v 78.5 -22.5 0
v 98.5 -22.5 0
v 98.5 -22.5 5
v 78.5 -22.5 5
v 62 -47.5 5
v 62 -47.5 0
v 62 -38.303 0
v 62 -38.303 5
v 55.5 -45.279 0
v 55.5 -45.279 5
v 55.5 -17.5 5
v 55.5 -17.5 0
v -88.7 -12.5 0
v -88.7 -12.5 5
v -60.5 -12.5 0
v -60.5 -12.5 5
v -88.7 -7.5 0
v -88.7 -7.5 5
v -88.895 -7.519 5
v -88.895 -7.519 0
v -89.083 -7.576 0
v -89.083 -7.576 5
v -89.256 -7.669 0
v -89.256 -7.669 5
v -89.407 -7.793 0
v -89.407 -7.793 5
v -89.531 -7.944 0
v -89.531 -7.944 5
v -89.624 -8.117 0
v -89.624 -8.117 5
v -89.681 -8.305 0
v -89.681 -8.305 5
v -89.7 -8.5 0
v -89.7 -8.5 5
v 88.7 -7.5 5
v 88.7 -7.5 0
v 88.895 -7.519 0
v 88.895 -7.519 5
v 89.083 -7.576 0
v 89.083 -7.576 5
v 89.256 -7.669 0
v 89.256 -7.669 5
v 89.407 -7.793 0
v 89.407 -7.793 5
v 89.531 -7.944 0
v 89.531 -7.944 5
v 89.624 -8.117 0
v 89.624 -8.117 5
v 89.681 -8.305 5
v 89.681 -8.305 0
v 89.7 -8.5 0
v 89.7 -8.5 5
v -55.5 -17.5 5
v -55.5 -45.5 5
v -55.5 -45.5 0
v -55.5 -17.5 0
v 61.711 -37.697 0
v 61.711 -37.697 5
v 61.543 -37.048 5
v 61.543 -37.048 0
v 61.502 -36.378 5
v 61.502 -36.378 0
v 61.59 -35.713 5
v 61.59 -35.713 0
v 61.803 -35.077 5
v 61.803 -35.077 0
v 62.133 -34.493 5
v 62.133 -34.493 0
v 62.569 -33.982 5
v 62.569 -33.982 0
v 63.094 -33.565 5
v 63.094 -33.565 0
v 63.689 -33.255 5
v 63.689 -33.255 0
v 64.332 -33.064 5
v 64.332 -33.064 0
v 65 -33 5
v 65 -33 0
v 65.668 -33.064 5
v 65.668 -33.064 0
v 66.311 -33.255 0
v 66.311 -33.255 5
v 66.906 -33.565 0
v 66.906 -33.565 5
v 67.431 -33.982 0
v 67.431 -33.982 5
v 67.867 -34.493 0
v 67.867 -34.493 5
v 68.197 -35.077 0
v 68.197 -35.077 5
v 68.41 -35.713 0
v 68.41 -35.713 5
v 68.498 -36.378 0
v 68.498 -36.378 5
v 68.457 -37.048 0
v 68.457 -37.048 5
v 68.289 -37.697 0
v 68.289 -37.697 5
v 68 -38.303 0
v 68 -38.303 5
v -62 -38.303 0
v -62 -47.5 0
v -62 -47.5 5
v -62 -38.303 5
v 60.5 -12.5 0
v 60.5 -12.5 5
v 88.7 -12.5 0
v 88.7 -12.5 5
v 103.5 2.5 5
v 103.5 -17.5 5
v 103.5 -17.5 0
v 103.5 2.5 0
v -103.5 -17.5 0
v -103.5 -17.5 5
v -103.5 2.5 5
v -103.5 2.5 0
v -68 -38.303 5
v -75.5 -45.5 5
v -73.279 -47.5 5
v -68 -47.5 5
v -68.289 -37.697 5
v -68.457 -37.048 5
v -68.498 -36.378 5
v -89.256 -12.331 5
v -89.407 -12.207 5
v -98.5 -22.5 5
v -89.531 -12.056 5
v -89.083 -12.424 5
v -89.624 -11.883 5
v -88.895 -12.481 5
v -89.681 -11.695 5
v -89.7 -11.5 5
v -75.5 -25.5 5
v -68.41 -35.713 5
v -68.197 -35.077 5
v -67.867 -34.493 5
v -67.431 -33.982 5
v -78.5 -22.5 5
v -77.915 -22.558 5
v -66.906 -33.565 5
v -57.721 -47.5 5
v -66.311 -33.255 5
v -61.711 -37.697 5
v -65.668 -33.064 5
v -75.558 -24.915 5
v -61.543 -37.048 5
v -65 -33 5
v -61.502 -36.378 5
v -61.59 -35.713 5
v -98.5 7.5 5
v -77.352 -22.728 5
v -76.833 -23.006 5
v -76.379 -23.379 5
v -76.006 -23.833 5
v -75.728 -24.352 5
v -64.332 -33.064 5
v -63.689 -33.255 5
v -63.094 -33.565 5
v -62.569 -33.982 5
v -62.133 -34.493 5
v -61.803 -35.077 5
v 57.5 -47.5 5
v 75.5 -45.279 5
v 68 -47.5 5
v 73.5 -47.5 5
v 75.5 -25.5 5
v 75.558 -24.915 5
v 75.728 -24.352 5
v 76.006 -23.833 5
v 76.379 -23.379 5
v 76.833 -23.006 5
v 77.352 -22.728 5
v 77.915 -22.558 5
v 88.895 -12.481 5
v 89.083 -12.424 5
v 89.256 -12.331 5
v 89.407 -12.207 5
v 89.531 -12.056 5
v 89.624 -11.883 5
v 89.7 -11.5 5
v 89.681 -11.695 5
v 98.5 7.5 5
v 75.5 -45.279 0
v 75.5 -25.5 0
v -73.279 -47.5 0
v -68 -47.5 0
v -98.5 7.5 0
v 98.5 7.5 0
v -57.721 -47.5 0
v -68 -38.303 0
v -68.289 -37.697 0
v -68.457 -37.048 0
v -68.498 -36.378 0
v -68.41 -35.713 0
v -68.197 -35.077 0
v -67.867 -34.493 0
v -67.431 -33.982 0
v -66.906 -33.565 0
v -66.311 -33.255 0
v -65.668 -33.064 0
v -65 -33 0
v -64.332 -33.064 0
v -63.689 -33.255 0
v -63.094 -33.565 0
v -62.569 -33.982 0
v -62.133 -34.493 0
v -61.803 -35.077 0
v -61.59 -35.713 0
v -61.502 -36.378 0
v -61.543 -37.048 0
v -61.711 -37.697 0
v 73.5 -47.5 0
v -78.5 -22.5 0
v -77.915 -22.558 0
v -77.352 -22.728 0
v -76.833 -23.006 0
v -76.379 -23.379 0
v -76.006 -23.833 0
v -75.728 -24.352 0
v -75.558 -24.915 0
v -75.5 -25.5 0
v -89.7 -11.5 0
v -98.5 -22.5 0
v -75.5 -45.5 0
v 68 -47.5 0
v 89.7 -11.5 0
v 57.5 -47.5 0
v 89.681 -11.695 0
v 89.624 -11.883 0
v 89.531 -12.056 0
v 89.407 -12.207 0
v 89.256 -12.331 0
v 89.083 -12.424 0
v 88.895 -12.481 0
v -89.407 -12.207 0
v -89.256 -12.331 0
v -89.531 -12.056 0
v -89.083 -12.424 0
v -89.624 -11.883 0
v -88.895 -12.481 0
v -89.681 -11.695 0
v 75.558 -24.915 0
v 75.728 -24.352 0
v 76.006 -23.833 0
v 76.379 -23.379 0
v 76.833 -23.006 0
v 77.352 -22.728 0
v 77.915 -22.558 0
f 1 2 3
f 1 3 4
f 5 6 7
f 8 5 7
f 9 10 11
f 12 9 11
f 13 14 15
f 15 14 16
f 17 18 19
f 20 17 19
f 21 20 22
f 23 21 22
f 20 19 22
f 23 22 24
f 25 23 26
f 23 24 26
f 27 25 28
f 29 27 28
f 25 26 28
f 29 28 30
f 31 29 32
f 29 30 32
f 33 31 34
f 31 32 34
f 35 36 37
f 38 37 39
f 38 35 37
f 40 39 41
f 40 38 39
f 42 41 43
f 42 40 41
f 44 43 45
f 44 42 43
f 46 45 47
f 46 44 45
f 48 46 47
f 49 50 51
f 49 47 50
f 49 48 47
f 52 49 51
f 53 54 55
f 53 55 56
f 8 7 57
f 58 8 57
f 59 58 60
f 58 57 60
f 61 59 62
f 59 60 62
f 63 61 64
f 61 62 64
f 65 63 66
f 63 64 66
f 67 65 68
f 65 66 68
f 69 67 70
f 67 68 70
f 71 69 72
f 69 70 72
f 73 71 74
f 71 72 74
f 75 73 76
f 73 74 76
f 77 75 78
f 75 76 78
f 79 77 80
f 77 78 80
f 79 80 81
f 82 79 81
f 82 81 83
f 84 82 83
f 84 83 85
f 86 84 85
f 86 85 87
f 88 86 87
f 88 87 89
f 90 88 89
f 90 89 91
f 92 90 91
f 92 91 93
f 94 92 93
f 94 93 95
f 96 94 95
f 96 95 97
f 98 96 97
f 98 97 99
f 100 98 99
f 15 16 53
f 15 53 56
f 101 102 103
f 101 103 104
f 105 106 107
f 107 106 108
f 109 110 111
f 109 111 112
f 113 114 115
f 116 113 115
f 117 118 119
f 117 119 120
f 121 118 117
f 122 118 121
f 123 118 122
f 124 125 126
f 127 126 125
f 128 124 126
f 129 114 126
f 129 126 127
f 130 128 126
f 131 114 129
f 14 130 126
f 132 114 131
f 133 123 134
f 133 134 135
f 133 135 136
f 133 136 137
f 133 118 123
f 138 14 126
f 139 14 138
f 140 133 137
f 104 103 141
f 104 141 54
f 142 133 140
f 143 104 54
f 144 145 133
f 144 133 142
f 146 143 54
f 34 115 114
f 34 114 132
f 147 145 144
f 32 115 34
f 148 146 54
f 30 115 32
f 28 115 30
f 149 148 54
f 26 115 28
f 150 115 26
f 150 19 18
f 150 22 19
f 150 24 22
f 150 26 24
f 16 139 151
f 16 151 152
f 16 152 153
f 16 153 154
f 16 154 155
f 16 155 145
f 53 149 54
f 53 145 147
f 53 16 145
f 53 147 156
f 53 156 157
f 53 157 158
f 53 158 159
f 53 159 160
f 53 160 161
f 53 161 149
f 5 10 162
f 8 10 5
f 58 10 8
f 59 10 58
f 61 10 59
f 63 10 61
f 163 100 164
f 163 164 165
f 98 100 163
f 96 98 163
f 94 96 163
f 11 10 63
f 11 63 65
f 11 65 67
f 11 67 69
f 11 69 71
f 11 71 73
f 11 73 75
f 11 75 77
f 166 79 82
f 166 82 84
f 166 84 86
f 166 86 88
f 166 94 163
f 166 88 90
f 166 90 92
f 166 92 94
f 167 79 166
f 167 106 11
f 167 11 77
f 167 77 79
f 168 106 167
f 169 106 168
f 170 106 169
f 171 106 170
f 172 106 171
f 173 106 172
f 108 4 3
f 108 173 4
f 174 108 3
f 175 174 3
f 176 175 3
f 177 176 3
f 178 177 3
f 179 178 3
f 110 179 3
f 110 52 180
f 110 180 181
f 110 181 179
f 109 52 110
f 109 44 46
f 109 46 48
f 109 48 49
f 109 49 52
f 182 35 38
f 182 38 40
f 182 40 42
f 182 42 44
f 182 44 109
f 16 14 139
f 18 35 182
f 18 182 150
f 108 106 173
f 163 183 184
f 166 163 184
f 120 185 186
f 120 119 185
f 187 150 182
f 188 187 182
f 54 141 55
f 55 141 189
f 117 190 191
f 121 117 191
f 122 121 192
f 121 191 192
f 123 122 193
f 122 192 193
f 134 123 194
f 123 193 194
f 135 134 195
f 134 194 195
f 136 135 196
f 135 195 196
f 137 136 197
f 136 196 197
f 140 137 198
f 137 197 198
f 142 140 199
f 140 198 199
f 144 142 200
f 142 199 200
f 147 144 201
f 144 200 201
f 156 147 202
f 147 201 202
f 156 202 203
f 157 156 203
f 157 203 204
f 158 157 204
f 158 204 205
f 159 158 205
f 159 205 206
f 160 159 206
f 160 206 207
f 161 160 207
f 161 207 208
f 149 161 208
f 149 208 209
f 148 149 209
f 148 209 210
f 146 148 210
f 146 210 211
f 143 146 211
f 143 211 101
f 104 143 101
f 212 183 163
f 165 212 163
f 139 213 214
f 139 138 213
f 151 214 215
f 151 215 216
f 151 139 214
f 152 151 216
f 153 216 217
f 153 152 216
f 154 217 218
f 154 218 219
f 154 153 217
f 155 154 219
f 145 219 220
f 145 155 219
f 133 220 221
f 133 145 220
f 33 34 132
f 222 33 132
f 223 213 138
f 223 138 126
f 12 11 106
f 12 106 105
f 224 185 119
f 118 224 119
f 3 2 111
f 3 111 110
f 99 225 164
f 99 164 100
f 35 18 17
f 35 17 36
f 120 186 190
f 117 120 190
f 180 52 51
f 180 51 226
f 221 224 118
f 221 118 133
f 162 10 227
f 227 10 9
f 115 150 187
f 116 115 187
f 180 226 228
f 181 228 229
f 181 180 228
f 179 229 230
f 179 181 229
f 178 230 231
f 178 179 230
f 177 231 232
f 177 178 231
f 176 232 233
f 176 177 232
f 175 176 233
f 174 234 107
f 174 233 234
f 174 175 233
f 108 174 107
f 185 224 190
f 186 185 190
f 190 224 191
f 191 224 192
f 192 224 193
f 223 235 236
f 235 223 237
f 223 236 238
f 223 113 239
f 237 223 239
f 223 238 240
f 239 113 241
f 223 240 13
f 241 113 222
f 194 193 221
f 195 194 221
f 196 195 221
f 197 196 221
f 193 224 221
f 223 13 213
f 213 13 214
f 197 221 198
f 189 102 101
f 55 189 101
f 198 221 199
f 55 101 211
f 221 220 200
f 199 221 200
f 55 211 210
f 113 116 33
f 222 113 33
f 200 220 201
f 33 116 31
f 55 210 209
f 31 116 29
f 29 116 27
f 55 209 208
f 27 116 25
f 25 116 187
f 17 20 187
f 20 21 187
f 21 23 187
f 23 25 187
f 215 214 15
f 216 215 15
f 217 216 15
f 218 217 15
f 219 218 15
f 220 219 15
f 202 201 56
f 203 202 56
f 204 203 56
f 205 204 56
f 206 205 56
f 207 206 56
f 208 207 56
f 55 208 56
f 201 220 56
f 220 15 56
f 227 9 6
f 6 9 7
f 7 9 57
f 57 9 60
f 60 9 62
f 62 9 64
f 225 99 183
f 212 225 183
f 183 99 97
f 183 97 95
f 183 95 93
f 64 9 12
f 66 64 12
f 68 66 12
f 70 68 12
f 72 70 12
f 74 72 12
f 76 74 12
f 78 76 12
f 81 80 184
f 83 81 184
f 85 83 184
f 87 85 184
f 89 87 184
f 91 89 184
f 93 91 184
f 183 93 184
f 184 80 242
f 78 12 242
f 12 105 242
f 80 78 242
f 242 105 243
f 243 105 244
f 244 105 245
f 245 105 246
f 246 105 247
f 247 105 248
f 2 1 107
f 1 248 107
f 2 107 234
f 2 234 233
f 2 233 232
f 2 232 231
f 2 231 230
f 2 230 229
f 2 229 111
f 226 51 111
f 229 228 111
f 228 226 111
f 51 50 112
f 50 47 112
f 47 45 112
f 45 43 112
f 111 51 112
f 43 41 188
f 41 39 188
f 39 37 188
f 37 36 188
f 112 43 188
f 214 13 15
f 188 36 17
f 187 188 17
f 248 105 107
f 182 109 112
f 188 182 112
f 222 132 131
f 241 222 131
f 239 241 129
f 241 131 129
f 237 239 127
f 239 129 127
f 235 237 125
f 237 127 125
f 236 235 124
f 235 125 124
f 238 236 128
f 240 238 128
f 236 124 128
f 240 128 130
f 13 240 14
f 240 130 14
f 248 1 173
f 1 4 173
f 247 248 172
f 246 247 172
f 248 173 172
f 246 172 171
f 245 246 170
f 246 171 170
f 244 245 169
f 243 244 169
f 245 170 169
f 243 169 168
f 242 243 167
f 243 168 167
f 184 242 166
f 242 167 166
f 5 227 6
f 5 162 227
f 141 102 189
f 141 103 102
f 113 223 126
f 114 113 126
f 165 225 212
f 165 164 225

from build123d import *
from OCP.BRepFilletAPI import BRepFilletAPI_MakeChamfer

# Parameters (mm, degrees)
SKETCH_1_W           = 177
SKETCH_1_H           = 15
EXTRUDE_1_DEPTH      = 5
SKETCH_3_W           = 15
SKETCH_3_H           = 55
EXTRUDE_3_DEPTH      = 5
SKETCH_9_W           = 33
SKETCH_9_H           = 35
EXTRUDE_5_DEPTH      = 5
CUT_EXTRUDE_4_REACH  = 115.989
CUT_EXTRUDE_5_REACH  = 115.989
SKETCH_10_R          = 3
SKETCH_13_W          = 28
SKETCH_13_H          = 25
CUT_EXTRUDE_8_DEPTH  = 10
CHAMFER_4_SIZE       = 5
FILLET_3_R           = 3
SKETCH_14_W          = 6
SKETCH_14_H          = 11
CUT_EXTRUDE_9_DEPTH  = 10
SKETCH_15_R          = 3.5
CUT_EXTRUDE_10_DEPTH = 10
CHAMFER_5_SIZE       = 2
CHAMFER_5_SIZE2      = 2.22122503


with BuildPart() as part:
    # 스케치1 → 보스-돌출1 (new body)
    with BuildSketch(Plane.XY):
        Rectangle(SKETCH_1_W, SKETCH_1_H)
    extrude(amount=EXTRUDE_1_DEPTH)

    # 스케치3 → 보스-돌출3 (add)
    with BuildSketch(Plane.XY.offset(5)):
        with Locations((96, -20)):
            Rectangle(SKETCH_3_W, SKETCH_3_H)
        with Locations((-96, -20)):
            Rectangle(SKETCH_3_W, SKETCH_3_H)
    extrude(amount=-EXTRUDE_3_DEPTH)

    # 스케치9 → 보스-돌출5 (add)
    with BuildSketch(Plane.XY.offset(5)):
        with Locations((-72, -30)):
            Rectangle(SKETCH_9_W, SKETCH_9_H)
        with Locations((72, -30)):
            Rectangle(SKETCH_9_W, SKETCH_9_H)
    extrude(amount=-EXTRUDE_5_DEPTH)

    # 스케치8 → 컷-돌출4 (cut, up to next)
    with BuildSketch(Plane.XY.offset(5), mode=Mode.PRIVATE) as cut_extrude_4_sk1:
        with BuildLine():
            Line((-88.5, -7.5), (-88.7, -7.5))
            ThreePointArc((-88.7, -7.5), (-89.407106781, -7.792893219), (-89.7, -8.5))
            Line((-89.7, -8.5), (-89.7, -11.5))
            ThreePointArc((-89.7, -11.5), (-89.407106781, -12.207106781), (-88.7, -12.5))
            Line((-88.7, -12.5), (-88.5, -12.5))
            Line((-88.5, -12.5), (-88.5, -7.5))
        make_face()
    cut_extrude_4_tool1 = extrude(cut_extrude_4_sk1.sketch, amount=-CUT_EXTRUDE_4_REACH, mode=Mode.PRIVATE) & part.part
    # 스케치8 → 컷-돌출4 (cut, up to next)
    with BuildSketch(Plane.XY.offset(5), mode=Mode.PRIVATE) as cut_extrude_4_sk2:
        with BuildLine():
            Line((88.5, -7.5), (88.7, -7.5))
            ThreePointArc((88.7, -7.5), (89.407106781, -7.792893219), (89.7, -8.5))
            Line((89.7, -8.5), (89.7, -11.5))
            ThreePointArc((89.7, -11.5), (89.407106781, -12.207106781), (88.7, -12.5))
            Line((88.7, -12.5), (88.5, -12.5))
            Line((88.5, -12.5), (88.5, -7.5))
        make_face()
    cut_extrude_4_tool2 = extrude(cut_extrude_4_sk2.sketch, amount=-CUT_EXTRUDE_4_REACH, mode=Mode.PRIVATE) & part.part
    add(cut_extrude_4_tool1.solids().sort_by_distance((-89.070982, -10, 5))[0], mode=Mode.SUBTRACT)
    add(cut_extrude_4_tool2.solids().sort_by_distance((89.070982, -10, 5))[0], mode=Mode.SUBTRACT)

    # 스케치10 → 컷-돌출5 (cut, up to next)
    with BuildSketch(Plane.XY.offset(5), mode=Mode.PRIVATE) as cut_extrude_5_sk1:
        with Locations((65, -36.5)):
            Circle(SKETCH_10_R)
    cut_extrude_5_tool1 = extrude(cut_extrude_5_sk1.sketch, amount=-CUT_EXTRUDE_5_REACH, mode=Mode.PRIVATE) & part.part
    # 스케치10 → 컷-돌출5 (cut, up to next)
    with BuildSketch(Plane.XY.offset(5), mode=Mode.PRIVATE) as cut_extrude_5_sk2:
        with Locations((-65, -36.5)):
            Circle(SKETCH_10_R)
    cut_extrude_5_tool2 = extrude(cut_extrude_5_sk2.sketch, amount=-CUT_EXTRUDE_5_REACH, mode=Mode.PRIVATE) & part.part
    add(cut_extrude_5_tool1.solids().sort_by_distance((65, -36.5, 5))[0], mode=Mode.SUBTRACT)
    add(cut_extrude_5_tool2.solids().sort_by_distance((-65, -36.5, 5))[0], mode=Mode.SUBTRACT)

    # 스케치13 → 컷-돌출8 (cut)
    with BuildSketch(Plane(origin=(0, 0, 0), x_dir=(-1, 0, 0), z_dir=(0, 0, -1))):
        with Locations((-89.5, -35)):
            Rectangle(SKETCH_13_W, SKETCH_13_H)
        with Locations((89.5, -35)):
            Rectangle(SKETCH_13_W, SKETCH_13_H)
    extrude(amount=-CUT_EXTRUDE_8_DEPTH, mode=Mode.SUBTRACT)

    # 모따기4
    chamfer_4_edges = [part.edges().sort_by_distance(p)[0] for p in [
        (103.5, -22.5, 2.5),
        (-103.5, -22.5, 2.5),
        (103.5, 7.5, 2.5),
        (-103.5, 7.5, 2.5),
        (-55.5, -12.5, 2.5),
        (55.5, -12.5, 2.5),
    ]]
    chamfer(chamfer_4_edges, length=CHAMFER_4_SIZE)

    # 필렛3
    fillet_3_edges = [part.edges().sort_by_distance(p)[0] for p in [
        (75.5, -22.5, 2.5),
        (-75.5, -22.5, 2.5),
    ]]
    fillet(fillet_3_edges, radius=FILLET_3_R)

    # 스케치14 → 컷-돌출9 (cut)
    with BuildSketch(Plane(origin=(0, 0, 0), x_dir=(-1, 0, 0), z_dir=(0, 0, -1))):
        with Locations((-65, -42)):
            Rectangle(SKETCH_14_W, SKETCH_14_H)
        with Locations((65, -42)):
            Rectangle(SKETCH_14_W, SKETCH_14_H)
    extrude(amount=-CUT_EXTRUDE_9_DEPTH, mode=Mode.SUBTRACT)

    # 스케치15 → 컷-돌출10 (cut)
    with BuildSketch(Plane(origin=(0, 0, 0), x_dir=(-1, 0, 0), z_dir=(0, 0, -1))):
        with Locations((65, -36.5)):
            Circle(SKETCH_15_R)
        with Locations((-65, -36.5)):
            Circle(SKETCH_15_R)
    extrude(amount=-CUT_EXTRUDE_10_DEPTH, mode=Mode.SUBTRACT)

    # 모따기5: one chamfer whose edges measure the first distance from different faces: ONE call of the kernel's chamfer builder (chamfer() names one face for all edges)
    chamfer_5_edges_1 = [part.edges().sort_by_distance(p)[0] for p in [
        (75.5, -47.5, 2.5),
    ]]
    chamfer_5_side_1 = [part.faces().sort_by_distance(p)[0] for p in [
        (71.75, -47.5, 2.5),
    ]]
    chamfer_5_edges_2 = [part.edges().sort_by_distance(p)[0] for p in [
        (-75.5, -47.5, 2.5),
    ]]
    chamfer_5_side_2 = [part.faces().sort_by_distance(p)[0] for p in [
        (-75.5, -36.5, 2.5),
    ]]
    chamfer_5_edges_3 = [part.edges().sort_by_distance(p)[0] for p in [
        (-55.5, -47.5, 2.5),
    ]]
    chamfer_5_side_3 = [part.faces().sort_by_distance(p)[0] for p in [
        (-55.5, -32.5, 2.5),
    ]]
    chamfer_5_edges_4 = [part.edges().sort_by_distance(p)[0] for p in [
        (55.5, -47.5, 2.5),
    ]]
    chamfer_5_side_4 = [part.faces().sort_by_distance(p)[0] for p in [
        (58.75, -47.5, 2.5),
    ]]
    chamfer_5 = BRepFilletAPI_MakeChamfer(part.part.solid().wrapped)
    for e in chamfer_5_edges_1:
        chamfer_5.Add(CHAMFER_5_SIZE, CHAMFER_5_SIZE2, e.wrapped, chamfer_5_side_1[0].wrapped)  # the first distance lies on this face
    for e in chamfer_5_edges_2:
        chamfer_5.Add(CHAMFER_5_SIZE, CHAMFER_5_SIZE2, e.wrapped, chamfer_5_side_2[0].wrapped)  # the first distance lies on this face
    for e in chamfer_5_edges_3:
        chamfer_5.Add(CHAMFER_5_SIZE, CHAMFER_5_SIZE2, e.wrapped, chamfer_5_side_3[0].wrapped)  # the first distance lies on this face
    for e in chamfer_5_edges_4:
        chamfer_5.Add(CHAMFER_5_SIZE, CHAMFER_5_SIZE2, e.wrapped, chamfer_5_side_4[0].wrapped)  # the first distance lies on this face
    add(Compound.cast(chamfer_5.Shape()), mode=Mode.REPLACE)


solid = part.part
